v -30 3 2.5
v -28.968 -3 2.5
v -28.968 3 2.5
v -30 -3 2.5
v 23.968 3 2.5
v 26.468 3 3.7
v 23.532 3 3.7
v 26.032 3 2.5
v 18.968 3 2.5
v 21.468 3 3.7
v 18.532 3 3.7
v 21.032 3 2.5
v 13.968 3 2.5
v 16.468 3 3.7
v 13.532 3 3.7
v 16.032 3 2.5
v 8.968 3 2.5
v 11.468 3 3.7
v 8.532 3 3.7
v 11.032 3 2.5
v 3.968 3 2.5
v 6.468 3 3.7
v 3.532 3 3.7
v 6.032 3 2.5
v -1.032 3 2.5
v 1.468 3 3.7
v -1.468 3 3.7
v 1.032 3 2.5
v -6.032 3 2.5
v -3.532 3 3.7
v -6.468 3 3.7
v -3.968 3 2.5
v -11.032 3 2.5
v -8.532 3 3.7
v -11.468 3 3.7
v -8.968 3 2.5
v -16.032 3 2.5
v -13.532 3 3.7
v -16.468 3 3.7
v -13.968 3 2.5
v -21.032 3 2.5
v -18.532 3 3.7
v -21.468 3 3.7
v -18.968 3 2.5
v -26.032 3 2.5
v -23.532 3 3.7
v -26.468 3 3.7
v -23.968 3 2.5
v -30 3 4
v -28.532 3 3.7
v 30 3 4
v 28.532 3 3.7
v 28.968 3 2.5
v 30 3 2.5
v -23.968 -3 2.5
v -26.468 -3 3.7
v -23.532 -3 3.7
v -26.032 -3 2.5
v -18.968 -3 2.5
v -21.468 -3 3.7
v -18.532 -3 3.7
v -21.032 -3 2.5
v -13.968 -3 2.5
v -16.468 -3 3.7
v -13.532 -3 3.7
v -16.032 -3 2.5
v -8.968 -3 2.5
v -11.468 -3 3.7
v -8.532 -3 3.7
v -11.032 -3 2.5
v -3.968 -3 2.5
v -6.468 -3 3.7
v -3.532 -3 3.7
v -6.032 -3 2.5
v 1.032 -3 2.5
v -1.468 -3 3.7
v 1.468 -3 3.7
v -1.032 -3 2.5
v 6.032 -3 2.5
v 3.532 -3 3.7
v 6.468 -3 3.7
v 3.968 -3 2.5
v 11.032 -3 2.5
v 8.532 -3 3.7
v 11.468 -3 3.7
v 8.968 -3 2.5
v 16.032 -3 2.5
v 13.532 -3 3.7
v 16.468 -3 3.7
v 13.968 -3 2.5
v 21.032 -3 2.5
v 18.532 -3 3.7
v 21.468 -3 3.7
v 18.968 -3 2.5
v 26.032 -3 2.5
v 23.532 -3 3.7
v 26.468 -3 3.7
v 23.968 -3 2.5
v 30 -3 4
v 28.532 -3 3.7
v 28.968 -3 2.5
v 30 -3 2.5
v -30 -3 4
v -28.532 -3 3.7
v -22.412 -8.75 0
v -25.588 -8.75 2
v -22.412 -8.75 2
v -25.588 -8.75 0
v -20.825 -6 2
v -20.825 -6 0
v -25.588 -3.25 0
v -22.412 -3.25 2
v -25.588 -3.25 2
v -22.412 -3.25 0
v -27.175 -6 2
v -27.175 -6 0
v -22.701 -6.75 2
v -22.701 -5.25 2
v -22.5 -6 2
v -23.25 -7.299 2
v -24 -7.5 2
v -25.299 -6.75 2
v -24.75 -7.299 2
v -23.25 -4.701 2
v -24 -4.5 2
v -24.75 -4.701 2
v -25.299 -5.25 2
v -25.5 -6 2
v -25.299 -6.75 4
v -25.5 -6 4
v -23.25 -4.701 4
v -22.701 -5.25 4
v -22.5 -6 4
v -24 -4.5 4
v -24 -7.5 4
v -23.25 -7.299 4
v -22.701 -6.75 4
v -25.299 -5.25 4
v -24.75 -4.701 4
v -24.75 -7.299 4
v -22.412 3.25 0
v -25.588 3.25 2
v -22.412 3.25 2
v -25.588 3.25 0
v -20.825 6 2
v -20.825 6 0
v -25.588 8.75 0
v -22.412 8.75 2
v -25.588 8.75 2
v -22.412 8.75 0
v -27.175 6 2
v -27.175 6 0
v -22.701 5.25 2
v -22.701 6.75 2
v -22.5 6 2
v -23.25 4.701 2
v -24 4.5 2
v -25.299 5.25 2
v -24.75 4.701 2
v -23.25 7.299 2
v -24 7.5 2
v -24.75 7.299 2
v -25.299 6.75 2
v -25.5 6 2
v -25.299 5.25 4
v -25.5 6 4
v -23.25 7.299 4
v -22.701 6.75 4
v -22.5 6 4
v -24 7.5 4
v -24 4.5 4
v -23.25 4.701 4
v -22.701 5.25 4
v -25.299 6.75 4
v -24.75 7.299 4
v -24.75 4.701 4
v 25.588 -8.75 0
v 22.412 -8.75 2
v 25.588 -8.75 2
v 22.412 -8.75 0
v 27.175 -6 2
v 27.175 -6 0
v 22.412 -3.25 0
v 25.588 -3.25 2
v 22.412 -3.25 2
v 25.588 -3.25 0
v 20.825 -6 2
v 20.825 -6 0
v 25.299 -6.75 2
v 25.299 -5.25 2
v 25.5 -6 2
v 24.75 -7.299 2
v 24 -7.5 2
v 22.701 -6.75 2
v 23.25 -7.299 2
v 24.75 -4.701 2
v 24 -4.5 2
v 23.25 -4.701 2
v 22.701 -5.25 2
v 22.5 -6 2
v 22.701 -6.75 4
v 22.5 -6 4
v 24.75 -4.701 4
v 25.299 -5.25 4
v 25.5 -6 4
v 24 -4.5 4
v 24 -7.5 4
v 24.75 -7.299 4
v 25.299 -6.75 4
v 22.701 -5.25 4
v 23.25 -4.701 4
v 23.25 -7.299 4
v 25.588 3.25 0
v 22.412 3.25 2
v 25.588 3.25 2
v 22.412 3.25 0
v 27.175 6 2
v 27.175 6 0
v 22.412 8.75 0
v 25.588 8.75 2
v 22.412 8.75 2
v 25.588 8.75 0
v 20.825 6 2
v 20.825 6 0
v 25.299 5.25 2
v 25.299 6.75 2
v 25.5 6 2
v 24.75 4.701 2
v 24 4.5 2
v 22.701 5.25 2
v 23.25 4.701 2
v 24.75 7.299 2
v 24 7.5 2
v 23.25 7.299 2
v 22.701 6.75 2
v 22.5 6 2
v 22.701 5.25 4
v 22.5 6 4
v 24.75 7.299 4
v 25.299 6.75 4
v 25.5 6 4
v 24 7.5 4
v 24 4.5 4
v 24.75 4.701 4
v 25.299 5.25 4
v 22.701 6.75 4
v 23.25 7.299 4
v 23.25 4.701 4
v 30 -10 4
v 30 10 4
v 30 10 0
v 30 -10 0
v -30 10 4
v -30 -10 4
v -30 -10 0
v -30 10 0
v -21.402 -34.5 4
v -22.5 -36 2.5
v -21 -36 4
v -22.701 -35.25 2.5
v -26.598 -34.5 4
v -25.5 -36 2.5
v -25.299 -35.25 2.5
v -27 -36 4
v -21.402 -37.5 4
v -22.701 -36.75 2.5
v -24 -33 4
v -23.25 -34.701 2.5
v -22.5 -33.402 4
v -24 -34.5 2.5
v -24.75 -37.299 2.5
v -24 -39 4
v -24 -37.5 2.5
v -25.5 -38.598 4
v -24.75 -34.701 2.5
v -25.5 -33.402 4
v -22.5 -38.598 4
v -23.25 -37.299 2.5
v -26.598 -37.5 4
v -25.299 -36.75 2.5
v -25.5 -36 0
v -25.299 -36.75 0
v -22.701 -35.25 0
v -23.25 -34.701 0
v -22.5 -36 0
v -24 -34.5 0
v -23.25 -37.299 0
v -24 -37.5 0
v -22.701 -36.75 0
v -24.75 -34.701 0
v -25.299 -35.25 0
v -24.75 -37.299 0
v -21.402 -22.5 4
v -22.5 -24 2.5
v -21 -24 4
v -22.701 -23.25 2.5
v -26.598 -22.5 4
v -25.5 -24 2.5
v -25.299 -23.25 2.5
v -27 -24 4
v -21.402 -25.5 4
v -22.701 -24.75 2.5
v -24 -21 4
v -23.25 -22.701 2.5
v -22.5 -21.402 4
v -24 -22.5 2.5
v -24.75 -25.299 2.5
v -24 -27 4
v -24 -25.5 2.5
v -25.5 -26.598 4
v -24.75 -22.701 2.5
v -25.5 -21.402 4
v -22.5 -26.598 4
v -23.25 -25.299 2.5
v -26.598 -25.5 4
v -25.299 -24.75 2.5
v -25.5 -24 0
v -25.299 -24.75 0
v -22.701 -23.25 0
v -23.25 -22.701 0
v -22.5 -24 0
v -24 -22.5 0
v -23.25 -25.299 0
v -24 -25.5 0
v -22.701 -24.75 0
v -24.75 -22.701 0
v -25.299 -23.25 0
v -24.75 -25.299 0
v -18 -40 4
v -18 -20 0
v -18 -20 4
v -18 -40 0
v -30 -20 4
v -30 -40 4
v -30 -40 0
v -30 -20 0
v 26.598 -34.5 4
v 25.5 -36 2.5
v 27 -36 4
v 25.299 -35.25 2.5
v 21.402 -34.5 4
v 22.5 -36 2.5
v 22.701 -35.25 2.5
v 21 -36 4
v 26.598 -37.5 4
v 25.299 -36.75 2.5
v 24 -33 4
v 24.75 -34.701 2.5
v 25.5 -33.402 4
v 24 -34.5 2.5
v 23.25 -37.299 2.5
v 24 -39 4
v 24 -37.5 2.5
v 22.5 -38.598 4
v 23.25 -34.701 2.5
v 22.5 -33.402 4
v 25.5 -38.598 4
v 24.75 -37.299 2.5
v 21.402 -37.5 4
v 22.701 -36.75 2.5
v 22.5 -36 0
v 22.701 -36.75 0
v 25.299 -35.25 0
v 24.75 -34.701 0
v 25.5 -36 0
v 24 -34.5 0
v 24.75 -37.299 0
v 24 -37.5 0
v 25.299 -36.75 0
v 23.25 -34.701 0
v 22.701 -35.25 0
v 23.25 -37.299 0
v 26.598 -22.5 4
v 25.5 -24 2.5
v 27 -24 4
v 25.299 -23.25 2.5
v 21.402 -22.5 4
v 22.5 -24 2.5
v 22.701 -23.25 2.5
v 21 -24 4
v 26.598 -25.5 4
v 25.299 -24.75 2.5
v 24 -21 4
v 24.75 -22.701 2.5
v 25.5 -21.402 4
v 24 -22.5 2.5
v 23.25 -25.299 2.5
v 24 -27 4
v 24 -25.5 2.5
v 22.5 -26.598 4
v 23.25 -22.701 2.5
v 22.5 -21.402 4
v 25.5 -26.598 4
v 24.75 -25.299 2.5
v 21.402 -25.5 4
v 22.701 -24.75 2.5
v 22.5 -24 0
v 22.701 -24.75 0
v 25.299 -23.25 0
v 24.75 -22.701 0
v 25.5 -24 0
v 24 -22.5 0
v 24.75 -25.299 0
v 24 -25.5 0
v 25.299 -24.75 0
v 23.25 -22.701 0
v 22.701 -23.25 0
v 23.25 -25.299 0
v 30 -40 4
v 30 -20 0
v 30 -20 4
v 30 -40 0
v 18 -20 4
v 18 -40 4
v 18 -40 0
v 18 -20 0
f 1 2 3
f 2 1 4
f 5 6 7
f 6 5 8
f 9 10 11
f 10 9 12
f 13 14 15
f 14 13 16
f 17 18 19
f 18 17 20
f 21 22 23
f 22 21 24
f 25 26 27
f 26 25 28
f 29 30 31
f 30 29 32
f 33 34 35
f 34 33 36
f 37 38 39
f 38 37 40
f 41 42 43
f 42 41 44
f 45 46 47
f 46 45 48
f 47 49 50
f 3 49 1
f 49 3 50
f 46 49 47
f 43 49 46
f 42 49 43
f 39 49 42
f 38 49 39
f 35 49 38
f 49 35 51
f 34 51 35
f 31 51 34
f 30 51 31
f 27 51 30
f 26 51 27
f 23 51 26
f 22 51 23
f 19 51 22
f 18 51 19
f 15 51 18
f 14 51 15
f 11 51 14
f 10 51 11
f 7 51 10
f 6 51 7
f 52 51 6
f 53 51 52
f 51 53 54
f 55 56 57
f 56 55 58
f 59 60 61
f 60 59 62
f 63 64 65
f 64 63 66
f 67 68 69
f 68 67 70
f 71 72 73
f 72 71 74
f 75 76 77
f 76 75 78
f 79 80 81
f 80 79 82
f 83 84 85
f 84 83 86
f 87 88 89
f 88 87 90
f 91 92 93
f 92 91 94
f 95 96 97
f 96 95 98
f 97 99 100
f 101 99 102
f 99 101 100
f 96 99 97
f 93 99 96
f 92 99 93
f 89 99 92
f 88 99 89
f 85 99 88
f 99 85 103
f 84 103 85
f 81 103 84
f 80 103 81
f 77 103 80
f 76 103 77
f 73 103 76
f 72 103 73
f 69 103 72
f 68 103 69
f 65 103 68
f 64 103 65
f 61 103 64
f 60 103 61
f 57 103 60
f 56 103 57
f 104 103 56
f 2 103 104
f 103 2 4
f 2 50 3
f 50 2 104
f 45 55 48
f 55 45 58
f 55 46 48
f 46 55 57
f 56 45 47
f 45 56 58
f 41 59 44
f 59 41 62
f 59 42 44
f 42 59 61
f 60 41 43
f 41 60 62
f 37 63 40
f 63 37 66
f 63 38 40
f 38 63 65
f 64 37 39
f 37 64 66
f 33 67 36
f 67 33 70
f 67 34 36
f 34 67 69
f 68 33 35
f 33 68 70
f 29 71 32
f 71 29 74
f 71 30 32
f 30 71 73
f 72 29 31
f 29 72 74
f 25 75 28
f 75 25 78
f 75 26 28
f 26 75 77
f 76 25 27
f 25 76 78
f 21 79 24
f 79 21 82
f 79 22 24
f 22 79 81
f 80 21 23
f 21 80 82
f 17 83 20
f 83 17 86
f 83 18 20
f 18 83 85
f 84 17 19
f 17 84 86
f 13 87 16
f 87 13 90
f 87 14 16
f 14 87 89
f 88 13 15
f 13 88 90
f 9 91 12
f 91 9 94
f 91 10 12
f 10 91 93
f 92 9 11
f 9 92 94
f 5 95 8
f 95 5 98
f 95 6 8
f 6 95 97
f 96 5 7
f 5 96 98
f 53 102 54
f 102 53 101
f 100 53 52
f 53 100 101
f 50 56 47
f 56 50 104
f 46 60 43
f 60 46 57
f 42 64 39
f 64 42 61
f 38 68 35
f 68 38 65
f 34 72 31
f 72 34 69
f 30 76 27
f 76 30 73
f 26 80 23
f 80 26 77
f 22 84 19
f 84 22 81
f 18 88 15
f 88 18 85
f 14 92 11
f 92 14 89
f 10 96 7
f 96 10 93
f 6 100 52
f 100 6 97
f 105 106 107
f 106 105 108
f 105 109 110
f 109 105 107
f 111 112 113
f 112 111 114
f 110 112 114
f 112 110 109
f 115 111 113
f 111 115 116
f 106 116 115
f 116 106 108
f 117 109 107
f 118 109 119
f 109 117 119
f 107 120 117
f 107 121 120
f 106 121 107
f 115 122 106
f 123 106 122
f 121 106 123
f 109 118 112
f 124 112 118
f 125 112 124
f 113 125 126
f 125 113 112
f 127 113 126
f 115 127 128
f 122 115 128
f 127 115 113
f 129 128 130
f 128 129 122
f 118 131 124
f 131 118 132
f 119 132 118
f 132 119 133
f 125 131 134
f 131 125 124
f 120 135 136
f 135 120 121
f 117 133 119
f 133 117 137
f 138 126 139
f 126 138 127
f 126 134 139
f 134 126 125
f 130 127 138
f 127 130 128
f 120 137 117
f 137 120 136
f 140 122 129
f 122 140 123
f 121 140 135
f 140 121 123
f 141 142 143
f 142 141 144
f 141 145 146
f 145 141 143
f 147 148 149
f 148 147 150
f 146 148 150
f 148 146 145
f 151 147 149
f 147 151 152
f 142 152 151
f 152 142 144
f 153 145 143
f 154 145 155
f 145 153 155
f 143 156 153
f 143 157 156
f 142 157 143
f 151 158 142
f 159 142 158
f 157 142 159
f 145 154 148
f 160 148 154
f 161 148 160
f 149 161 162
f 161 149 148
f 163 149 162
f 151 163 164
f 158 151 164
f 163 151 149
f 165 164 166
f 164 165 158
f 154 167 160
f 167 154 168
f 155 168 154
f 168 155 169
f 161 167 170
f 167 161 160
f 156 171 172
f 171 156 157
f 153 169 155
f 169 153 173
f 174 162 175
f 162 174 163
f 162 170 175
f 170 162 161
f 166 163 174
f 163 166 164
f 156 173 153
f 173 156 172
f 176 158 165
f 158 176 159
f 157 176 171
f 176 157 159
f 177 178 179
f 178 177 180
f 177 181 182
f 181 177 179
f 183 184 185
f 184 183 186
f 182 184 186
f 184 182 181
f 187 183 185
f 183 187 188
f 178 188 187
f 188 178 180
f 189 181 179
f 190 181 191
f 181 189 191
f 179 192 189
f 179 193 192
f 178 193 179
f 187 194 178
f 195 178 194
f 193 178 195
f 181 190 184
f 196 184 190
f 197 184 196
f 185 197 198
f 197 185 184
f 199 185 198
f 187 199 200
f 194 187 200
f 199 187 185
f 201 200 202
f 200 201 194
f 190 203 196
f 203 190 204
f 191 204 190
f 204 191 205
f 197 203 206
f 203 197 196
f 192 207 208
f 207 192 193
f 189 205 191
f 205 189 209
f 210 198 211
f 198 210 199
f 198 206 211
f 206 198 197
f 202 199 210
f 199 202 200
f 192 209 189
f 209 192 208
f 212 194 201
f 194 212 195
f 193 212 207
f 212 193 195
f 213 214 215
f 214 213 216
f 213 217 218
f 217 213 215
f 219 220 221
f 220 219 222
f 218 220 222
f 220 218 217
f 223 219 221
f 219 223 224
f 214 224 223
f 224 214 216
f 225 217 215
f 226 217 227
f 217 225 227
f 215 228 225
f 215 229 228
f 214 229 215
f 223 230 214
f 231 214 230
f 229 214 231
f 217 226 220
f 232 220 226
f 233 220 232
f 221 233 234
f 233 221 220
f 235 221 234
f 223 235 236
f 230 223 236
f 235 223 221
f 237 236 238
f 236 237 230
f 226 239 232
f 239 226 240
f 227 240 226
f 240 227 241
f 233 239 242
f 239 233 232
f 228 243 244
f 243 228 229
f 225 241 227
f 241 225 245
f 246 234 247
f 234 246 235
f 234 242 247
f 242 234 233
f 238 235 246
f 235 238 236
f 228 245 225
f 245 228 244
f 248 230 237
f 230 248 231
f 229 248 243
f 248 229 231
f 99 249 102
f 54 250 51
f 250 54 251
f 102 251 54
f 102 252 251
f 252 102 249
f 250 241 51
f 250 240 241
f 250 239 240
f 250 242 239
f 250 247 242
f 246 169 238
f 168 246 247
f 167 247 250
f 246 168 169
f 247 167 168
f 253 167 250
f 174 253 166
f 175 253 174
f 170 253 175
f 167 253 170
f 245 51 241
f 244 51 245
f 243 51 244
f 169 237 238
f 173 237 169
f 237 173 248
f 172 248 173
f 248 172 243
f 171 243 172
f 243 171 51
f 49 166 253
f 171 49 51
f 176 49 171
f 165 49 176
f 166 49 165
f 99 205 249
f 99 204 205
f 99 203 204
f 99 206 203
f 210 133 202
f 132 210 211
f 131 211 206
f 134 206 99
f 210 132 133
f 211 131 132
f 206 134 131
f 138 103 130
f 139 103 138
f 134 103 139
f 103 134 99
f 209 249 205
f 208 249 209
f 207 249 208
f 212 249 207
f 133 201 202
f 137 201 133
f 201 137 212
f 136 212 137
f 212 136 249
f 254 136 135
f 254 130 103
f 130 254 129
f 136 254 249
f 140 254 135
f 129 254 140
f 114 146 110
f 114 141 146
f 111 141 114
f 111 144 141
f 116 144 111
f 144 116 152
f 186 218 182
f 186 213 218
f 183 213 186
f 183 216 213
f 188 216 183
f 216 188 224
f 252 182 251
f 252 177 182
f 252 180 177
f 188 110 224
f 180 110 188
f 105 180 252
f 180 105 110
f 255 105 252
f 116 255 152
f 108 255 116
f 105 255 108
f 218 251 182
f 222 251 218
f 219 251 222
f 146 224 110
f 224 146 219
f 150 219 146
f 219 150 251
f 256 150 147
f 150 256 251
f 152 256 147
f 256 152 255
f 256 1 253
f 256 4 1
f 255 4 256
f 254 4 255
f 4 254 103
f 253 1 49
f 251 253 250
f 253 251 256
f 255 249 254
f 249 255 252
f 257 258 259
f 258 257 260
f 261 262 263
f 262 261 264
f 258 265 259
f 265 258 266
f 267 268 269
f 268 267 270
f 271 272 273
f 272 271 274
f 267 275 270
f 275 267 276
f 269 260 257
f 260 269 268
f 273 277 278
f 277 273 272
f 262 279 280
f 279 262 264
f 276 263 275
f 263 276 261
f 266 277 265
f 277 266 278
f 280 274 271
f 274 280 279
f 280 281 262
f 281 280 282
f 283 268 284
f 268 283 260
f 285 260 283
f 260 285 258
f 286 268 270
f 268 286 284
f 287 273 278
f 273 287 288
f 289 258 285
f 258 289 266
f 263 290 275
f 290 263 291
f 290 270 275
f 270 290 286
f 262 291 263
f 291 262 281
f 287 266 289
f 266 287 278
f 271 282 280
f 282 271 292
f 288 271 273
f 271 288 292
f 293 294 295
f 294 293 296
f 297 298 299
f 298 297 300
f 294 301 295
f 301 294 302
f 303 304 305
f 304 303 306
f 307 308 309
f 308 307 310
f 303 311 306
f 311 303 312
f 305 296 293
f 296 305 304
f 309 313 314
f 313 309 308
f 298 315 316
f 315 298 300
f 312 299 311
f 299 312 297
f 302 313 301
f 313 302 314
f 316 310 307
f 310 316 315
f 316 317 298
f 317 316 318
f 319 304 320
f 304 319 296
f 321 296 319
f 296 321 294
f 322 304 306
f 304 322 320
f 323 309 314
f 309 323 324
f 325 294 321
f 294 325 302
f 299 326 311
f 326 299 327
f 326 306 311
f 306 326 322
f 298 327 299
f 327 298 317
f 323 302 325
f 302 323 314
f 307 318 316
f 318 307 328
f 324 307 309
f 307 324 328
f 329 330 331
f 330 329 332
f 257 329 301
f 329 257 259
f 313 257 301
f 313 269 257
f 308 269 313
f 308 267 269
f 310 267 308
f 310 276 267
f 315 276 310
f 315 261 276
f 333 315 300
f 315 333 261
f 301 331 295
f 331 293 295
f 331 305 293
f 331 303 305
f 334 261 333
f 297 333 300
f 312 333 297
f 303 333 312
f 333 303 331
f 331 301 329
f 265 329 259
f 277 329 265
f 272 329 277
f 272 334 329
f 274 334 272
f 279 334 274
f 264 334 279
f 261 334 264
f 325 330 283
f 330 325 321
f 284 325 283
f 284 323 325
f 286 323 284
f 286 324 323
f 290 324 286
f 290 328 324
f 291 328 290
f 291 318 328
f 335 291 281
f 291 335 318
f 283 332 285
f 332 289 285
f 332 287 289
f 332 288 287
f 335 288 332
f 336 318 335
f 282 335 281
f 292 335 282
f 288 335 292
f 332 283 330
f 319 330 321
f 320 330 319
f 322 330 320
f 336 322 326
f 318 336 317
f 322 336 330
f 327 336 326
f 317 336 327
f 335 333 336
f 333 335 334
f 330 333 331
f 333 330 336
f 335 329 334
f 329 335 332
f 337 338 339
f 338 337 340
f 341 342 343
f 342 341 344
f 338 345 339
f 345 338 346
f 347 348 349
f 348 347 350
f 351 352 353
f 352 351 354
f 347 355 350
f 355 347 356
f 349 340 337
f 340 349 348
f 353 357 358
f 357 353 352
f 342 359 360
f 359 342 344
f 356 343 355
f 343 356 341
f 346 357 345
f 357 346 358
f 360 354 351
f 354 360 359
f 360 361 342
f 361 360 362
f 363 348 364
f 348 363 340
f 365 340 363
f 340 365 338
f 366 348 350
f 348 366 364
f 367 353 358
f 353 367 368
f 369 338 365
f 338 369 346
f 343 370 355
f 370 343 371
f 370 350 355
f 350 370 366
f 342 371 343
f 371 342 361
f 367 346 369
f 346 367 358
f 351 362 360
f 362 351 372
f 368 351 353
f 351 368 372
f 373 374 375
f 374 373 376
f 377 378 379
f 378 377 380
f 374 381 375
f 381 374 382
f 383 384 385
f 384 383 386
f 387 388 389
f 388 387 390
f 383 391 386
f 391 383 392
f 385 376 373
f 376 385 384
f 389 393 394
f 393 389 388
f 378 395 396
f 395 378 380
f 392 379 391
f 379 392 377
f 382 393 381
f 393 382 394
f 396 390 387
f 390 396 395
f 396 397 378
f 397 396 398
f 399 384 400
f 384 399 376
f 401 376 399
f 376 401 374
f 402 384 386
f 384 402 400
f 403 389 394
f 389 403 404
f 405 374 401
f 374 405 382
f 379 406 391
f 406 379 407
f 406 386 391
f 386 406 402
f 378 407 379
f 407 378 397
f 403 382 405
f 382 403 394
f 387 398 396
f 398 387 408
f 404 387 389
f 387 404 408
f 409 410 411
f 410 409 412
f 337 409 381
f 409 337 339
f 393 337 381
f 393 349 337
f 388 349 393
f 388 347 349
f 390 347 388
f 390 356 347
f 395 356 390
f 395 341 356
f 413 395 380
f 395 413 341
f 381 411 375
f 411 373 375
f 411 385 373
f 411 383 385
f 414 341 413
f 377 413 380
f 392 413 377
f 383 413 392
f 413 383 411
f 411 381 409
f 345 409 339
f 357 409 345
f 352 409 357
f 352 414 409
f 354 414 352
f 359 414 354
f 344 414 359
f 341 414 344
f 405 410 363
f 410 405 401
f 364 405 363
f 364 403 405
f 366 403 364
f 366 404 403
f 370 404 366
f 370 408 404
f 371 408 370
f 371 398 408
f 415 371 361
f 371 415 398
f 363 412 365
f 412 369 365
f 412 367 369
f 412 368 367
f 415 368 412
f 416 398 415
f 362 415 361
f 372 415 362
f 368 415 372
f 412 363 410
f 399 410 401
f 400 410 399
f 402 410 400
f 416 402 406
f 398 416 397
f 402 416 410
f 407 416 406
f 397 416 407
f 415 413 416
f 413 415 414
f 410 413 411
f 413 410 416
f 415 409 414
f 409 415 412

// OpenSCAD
// file: ../ShapeLibrary/CounterSink.scad
// Vertical countersink with top of countersink centred on origin 
//
// od = overall diameter (for screw head)
// oh = overall height (screw + head +recesss)
// sd = screw diameter
// sh = screw height (to top of countersink)
module countersinkZ(od, oh, sd, sh)
{
    union()
    {
        intersection()
	    {
            translate([0,0,-sh]) cylinder(r=od/2, h=oh, $fn=12);
            translate([0,0,-od/2]) cylinder(r1=0, r2=oh+od/2, h=oh+od/2, $fn=12);
        }
    translate([0,0,-sh]) cylinder(r=sd/2, h=sh, $fn=12);
    }
}

// Countersink with screw directed along negative X-axis
module countersinkX(od, oh, sd, sh)
{
    rotate([0,90,0]) countersinkZ(od, oh, sd, sh);
}

// Countersink with screw directed along negative Y-axis
module countersinkY(od, oh, sd, sh)
{
    rotate([90,0,0]) countersinkZ(od, oh, sd, sh);
}


// Examples
countersinkZ(8, 20, 4, 10);

translate([0,15,0]) countersinkX(8, 20, 4, 10);

translate([15,0,0]) countersinkY(8, 20, 4, 10);
// file: ../ShapeLibrary/NutRecess.scad
// Vertical screw hole nut recess with base of nut centred on origin 
//
// af = nut size across faces
// oh = overall height (screw + head + recesss)
// sd = screw diameter
// sh = screw height (to shoulder of nut recess)
//
module nutrecessZ(af, oh, sd, sh)
{
  sin60 = sin(60);
  union()
  {
    // % translate([0,0,oh-sh]) cylinder(r=af/sin60/2, h=5, $fn=12);
    // Square shoulder...
    //cylinder(r=af/sin60/2, h=oh-sh, $fn=6);
    // Angle shoulder at 45deg for printing...
    intersection()
    {
        translate([0,0,0]) cylinder(r=af/sin60/2, h=oh-sh, $fn=6);
        //translate([0,0,-((af/2)-(sd/2))/2])
        //  cylinder(r1=sd/2, r2=sd/2+(oh-sh), h=oh-sh, $fn=12);
    }
    translate([0,0,-sh]) cylinder(r=sd/2, h=oh, $fn=12);
  }
}

// Nut recess with screw directed along negative X-axis
module nutrecessX(af, oh, sd, sh)
{
    rotate([0,90,0]) nutrecessZ(af, oh, sd, sh);
}

// Nut recess with screw directed along negative Y-axis
module nutrecessY(af, oh, sd, sh)
{
    rotate([90,0,0]) nutrecessZ(af, oh, sd, sh);
}


// Examples
nutrecessZ(7, 20, 4, 10);

translate([0,15,0]) nutrecessX(7, 20, 4, 10);

translate([15,0,0]) nutrecessY(7, 20, 4, 10);
// main file
// Drive belt connector

use <../ShapeLibrary/NutRecess.scad>
use <../ShapeLibrary/CounterSink.scad>

// Tooth profile, tooth centred on origin
//
// p = pitch (tooth is half thios)
// w = width
// h = height of tooth (extra is added at base)
// a = angle of tooth face
//
module Tooth(p, w, h, a)
{
    d = 0.1;
    difference()
    {
        translate([0,0,d/2])
            cube(size=[p, w, h+d], center=true);
        translate([p/4,0,0])
            rotate([0,a,0])
                translate([p/2,0,0])
                    cube(size=[p, w*2, h*4], center=true);
        translate([-p/4,0,0])
            rotate([0,-a,0])
                translate([-p/2,0,0])
                    cube(size=[p, w*2, h*4], center=true);
    }
}

//Tooth(5, 6, 1.2, 20);

// Tooth profile section of length l and width w, 
// Aligned with and centred on X axis, with teeth downwards
// touching X-Y plane
// can be subtracted from object to leave tooth profile.
//
// Per http://www.contitech.de/pages/produkte/antriebsriemen/antrieb-industrie/download/TD_Synchroflex_en.pdf
//   Tooth pitch = 5
//   Tooth andgle between faces = 40%
//   Tooth height = 1.2
//
module ToothProfileX(l, w)
{
    tp = 5;
    th = 1.2;
    ta = 20;
    translate([-l/2-tp/4, -w/2, th]) cube(size=[l+tp/2, w, 10]);
    for ( to = [ -l/2 : tp : l/2 ] )
    {
        translate([to,0,th/2]) Tooth(tp,w,th,ta);
    }
}

//ToothProfileX(80, 6);

// Belt connector base, aLigned with X axis
//
// l   = overall length
// w   = overall width
// d   = overall thickness (depth)
// bw  = belt width
// bd  = belt depth (to extent of teeth)
// hpx = hole pitch X
// hpy = hole pitch Y
// hd  = hole diameter (countersink width twice this)
// naf = nut across faces size
// nt  = niut thickness
//
module BeltConnectorBase(l, w, d,  bw, bd,  hpx, hpy, hd,  naf, nt)
{
    difference()
    {
        translate([-l/2, -w/2, 0]) cube(size=[l, w, d]);
        # translate([0,0,d-bd]) ToothProfileX(l, bw);
        for ( xo = [-hpx/2, hpx/2])
        {
            for ( yo = [-hpy/2, hpy/2] )
            {
                translate([xo, yo, nt]) 
                    mirror([0,0,1])
                        nutrecessZ(naf, d*3, 3, d*2);
            }
        }
    }
}

// Belt connector clamping piece
module BeltConnectorClamp(l, w, d, hpy, hd, cd)
{
    difference()
    {
        translate([-l/2, -w/2, 0]) cube(size=[l, w, d]);
        for ( yo = [-hpy/2, hpy/2] )
        {
            translate([0, yo, d]) 
                countersinkZ(6, d*3, 3, d*2);
        }
    }
}

BeltConnectorBase(60, 20, 4,   6, 1.5,   48, 12, 3,   5.5, 2);

for ( xo = [ -24, 24 ] )
{
    translate([xo, -30, 0]) 
        BeltConnectorClamp(12, 20, 4,  12, 3, 6);
} 
